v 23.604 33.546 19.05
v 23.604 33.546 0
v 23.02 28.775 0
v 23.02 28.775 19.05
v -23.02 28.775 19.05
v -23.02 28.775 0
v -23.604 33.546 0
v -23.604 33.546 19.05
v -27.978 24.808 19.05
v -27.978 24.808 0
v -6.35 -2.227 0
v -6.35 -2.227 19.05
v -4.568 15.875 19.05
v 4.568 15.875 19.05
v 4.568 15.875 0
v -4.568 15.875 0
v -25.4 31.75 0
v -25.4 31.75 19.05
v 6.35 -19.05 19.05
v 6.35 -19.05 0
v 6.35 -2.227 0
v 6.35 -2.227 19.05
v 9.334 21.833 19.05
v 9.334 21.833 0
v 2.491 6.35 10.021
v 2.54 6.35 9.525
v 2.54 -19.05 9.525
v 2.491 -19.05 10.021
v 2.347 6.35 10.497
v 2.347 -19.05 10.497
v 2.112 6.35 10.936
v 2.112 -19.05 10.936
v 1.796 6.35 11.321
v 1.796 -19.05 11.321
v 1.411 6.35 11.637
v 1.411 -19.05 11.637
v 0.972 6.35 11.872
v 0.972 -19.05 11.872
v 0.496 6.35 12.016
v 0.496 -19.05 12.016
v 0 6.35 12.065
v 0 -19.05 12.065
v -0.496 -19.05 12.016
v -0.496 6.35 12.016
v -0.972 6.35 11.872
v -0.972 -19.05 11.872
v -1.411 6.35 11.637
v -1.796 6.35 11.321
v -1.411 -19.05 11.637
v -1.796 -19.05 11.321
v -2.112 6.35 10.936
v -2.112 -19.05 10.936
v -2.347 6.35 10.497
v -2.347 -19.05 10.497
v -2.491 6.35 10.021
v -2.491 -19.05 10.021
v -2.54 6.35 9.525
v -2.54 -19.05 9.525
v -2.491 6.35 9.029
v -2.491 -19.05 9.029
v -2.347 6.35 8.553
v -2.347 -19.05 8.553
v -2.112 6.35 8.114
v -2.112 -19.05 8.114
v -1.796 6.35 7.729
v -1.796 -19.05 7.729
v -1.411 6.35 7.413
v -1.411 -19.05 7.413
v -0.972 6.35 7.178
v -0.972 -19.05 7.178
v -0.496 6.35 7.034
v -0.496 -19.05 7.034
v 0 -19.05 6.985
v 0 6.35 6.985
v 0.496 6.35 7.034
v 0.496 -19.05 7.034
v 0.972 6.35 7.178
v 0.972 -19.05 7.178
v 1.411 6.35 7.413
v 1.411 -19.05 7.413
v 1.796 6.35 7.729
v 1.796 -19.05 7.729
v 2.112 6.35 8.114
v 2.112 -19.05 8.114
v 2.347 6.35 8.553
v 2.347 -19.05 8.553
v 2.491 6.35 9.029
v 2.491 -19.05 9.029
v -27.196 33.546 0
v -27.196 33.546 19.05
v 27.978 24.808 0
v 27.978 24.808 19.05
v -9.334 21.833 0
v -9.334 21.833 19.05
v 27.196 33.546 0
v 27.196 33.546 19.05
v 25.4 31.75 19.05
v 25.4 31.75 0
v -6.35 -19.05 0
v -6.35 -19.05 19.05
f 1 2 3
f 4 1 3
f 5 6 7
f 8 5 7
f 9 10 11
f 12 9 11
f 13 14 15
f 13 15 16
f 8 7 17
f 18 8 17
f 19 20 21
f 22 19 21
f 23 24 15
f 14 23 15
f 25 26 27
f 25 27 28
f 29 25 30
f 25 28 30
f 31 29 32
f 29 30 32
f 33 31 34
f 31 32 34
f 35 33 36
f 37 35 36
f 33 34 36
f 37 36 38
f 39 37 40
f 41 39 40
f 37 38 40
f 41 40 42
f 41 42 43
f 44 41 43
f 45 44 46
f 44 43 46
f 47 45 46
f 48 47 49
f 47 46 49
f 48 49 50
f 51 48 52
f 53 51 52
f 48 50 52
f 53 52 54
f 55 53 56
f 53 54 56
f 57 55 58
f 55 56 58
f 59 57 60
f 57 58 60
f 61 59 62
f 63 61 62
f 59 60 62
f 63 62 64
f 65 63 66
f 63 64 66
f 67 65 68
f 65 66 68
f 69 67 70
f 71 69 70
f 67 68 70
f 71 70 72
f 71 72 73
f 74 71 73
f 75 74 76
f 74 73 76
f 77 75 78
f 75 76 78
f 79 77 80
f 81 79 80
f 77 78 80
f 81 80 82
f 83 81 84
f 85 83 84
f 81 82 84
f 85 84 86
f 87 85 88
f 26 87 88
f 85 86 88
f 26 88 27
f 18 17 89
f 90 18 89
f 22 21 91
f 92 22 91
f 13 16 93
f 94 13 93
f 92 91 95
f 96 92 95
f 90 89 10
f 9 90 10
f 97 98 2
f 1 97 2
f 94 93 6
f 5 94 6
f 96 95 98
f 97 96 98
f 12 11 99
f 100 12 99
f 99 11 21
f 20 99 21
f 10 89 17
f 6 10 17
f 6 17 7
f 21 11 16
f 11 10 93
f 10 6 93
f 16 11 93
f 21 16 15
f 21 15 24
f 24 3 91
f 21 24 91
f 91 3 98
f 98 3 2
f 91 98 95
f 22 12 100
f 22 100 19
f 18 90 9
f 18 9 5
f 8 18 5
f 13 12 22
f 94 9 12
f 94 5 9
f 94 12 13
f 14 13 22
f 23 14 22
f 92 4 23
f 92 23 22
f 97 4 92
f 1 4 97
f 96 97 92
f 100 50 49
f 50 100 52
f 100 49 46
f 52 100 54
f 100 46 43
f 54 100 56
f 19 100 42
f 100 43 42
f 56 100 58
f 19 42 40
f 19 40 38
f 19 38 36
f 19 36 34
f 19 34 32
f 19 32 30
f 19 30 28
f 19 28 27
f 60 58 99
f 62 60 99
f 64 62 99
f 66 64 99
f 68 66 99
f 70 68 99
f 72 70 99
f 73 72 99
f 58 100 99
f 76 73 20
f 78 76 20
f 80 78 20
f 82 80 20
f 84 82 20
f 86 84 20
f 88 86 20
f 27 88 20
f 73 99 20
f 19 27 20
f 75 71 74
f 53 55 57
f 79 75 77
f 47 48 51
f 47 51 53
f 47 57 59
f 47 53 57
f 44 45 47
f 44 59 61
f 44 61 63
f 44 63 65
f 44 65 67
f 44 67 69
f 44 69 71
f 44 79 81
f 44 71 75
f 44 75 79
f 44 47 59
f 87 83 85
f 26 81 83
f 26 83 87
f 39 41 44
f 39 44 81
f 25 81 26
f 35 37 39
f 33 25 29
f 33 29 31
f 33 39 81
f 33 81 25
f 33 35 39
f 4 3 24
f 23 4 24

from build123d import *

# Parameters (mm, degrees)
F1_DEPTH = 19.05
F2_R     = 2.54
F3_DEPTH = 25.4


with BuildPart() as f1:
    # F0 (on Top) → F1 (new body)
    with BuildSketch(Plane.XY):
        with BuildLine():
            Line((6.35, 0), (0, 0))
            Line((0, 0), (0, -6.35))
            ThreePointArc((0, -6.35), (2.7507484386, -5.7232755505), (4.95851694, -3.966813552))
            ThreePointArc((4.95851694, -3.966813552), (5.9920398267, -2.1018940781), (6.35, 0))
        make_face()
        with BuildLine():
            Line((0, -6.35), (0, 0))
            Line((0, 0), (-6.35, 0))
            ThreePointArc((-6.35, 0), (-5.9920398267, -2.1018940781), (-4.95851694, -3.966813552))
            ThreePointArc((-4.95851694, -3.966813552), (-2.7507484386, -5.7232755505), (0, -6.35))
        make_face()
        with BuildLine():
            Line((0, 0), (-4.0659838908, 5.0824798635))
            Line((-4.0659838908, 5.0824798635), (-4.95851694, 3.966813552))
            ThreePointArc((-4.95851694, 3.966813552), (-5.9920398267, 2.1018940781), (-6.35, 0))
            Line((-6.35, 0), (0, 0))
        make_face()
        with BuildLine():
            Line((4.0659838908, 5.0824798635), (0, 0))
            Line((0, 0), (6.35, 0))
            ThreePointArc((6.35, 0), (5.9920398267, 2.1018940781), (4.95851694, 3.966813552))
            Line((4.95851694, 3.966813552), (4.0659838908, 5.0824798635))
        make_face()
        Polygon((0, 10.1649597269), (-4.0659838908, 5.0824798635), (0, 0), (4.0659838908, 5.0824798635), align=None)
        with BuildLine():
            Line((-4.0659838908, 5.0824798635), (-12.7, 15.875))
            Line((-12.7, 15.875), (-23.0199118688, 28.774889836))
            Line((-23.0199118688, 28.774889836), (-25.4, 31.75))
            Line((-25.4, 31.75), (-27.1960512242, 33.5460512242))
            Line((-27.1960512242, 33.5460512242), (-27.9784288088, 24.8080762841))
            Line((-27.9784288088, 24.8080762841), (-6.35, -2.2274597269))
            Line((-6.35, -2.2274597269), (-6.35, 0))
            ThreePointArc((-6.35, 0), (-5.9920398267, 2.1018940781), (-4.95851694, 3.966813552))
            Line((-4.95851694, 3.966813552), (-4.0659838908, 5.0824798635))
        make_face()
        Polygon((-4.5680322185, 15.875), (-12.7, 15.875), (-4.0659838908, 5.0824798635), (0, 10.1649597269), align=None)
        Polygon((4.5680322185, 15.875), (0, 10.1649597269), (4.0659838908, 5.0824798635), (12.7, 15.875), align=None)
        Polygon((4.5680322185, 15.875), (-4.5680322185, 15.875), (0, 10.1649597269), align=None)
        with BuildLine():
            Line((12.7, 15.875), (4.0659838908, 5.0824798635))
            Line((4.0659838908, 5.0824798635), (4.95851694, 3.966813552))
            ThreePointArc((4.95851694, 3.966813552), (5.9920398267, 2.1018940781), (6.35, 0))
            Line((6.35, 0), (6.35, -2.2274597269))
            Line((6.35, -2.2274597269), (27.9784288088, 24.8080762841))
            Line((27.9784288088, 24.8080762841), (27.1960512242, 33.5460512242))
            Line((27.1960512242, 33.5460512242), (25.4, 31.75))
            Line((25.4, 31.75), (23.0199118688, 28.774889836))
            Line((23.0199118688, 28.774889836), (12.7, 15.875))
        make_face()
        Polygon((9.3344051145, 21.8329661201), (4.5680322185, 15.875), (12.7, 15.875), (23.0199118688, 28.774889836), align=None)
        Polygon((-23.0199118688, 28.774889836), (-12.7, 15.875), (-4.5680322185, 15.875), (-9.3344051145, 21.8329661201), align=None)
        Polygon((23.6039487758, 33.5460512242), (23.0199118688, 28.774889836), (25.4, 31.75), align=None)
        Polygon((-25.4, 31.75), (-23.0199118688, 28.774889836), (-23.6039487758, 33.5460512242), align=None)
        with BuildLine():
            ThreePointArc((-4.95851694, -3.966813552), (-5.9920398267, -2.1018940781), (-6.35, 0))
            Line((-6.35, 0), (-6.35, -2.2274597269))
            Line((-6.35, -2.2274597269), (-4.95851694, -3.966813552))
        make_face()
        with BuildLine():
            Line((6.35, -2.2274597269), (6.35, 0))
            ThreePointArc((6.35, 0), (5.9920398267, -2.1018940781), (4.95851694, -3.966813552))
            Line((4.95851694, -3.966813552), (6.35, -2.2274597269))
        make_face()
        with BuildLine():
            ThreePointArc((4.95851694, -3.966813552), (2.7507484386, -5.7232755505), (0, -6.35))
            Line((0, -6.35), (0, -19.05))
            Line((0, -19.05), (6.35, -19.05))
            Line((6.35, -19.05), (6.35, -2.2274597269))
            Line((6.35, -2.2274597269), (4.95851694, -3.966813552))
        make_face()
        with BuildLine():
            Line((0, -19.05), (0, -6.35))
            ThreePointArc((0, -6.35), (-2.7507484386, -5.7232755505), (-4.95851694, -3.966813552))
            Line((-4.95851694, -3.966813552), (-6.35, -2.2274597269))
            Line((-6.35, -2.2274597269), (-6.35, -19.05))
            Line((-6.35, -19.05), (0, -19.05))
        make_face()
    extrude(amount=F1_DEPTH)

    # F2 (on face) → F3 (cut)
    with BuildSketch(Plane.XZ.offset(19.05)):
        with Locations((0, 9.525)):
            Circle(F2_R)
    extrude(amount=-F3_DEPTH, mode=Mode.SUBTRACT)


solid = f1.part
